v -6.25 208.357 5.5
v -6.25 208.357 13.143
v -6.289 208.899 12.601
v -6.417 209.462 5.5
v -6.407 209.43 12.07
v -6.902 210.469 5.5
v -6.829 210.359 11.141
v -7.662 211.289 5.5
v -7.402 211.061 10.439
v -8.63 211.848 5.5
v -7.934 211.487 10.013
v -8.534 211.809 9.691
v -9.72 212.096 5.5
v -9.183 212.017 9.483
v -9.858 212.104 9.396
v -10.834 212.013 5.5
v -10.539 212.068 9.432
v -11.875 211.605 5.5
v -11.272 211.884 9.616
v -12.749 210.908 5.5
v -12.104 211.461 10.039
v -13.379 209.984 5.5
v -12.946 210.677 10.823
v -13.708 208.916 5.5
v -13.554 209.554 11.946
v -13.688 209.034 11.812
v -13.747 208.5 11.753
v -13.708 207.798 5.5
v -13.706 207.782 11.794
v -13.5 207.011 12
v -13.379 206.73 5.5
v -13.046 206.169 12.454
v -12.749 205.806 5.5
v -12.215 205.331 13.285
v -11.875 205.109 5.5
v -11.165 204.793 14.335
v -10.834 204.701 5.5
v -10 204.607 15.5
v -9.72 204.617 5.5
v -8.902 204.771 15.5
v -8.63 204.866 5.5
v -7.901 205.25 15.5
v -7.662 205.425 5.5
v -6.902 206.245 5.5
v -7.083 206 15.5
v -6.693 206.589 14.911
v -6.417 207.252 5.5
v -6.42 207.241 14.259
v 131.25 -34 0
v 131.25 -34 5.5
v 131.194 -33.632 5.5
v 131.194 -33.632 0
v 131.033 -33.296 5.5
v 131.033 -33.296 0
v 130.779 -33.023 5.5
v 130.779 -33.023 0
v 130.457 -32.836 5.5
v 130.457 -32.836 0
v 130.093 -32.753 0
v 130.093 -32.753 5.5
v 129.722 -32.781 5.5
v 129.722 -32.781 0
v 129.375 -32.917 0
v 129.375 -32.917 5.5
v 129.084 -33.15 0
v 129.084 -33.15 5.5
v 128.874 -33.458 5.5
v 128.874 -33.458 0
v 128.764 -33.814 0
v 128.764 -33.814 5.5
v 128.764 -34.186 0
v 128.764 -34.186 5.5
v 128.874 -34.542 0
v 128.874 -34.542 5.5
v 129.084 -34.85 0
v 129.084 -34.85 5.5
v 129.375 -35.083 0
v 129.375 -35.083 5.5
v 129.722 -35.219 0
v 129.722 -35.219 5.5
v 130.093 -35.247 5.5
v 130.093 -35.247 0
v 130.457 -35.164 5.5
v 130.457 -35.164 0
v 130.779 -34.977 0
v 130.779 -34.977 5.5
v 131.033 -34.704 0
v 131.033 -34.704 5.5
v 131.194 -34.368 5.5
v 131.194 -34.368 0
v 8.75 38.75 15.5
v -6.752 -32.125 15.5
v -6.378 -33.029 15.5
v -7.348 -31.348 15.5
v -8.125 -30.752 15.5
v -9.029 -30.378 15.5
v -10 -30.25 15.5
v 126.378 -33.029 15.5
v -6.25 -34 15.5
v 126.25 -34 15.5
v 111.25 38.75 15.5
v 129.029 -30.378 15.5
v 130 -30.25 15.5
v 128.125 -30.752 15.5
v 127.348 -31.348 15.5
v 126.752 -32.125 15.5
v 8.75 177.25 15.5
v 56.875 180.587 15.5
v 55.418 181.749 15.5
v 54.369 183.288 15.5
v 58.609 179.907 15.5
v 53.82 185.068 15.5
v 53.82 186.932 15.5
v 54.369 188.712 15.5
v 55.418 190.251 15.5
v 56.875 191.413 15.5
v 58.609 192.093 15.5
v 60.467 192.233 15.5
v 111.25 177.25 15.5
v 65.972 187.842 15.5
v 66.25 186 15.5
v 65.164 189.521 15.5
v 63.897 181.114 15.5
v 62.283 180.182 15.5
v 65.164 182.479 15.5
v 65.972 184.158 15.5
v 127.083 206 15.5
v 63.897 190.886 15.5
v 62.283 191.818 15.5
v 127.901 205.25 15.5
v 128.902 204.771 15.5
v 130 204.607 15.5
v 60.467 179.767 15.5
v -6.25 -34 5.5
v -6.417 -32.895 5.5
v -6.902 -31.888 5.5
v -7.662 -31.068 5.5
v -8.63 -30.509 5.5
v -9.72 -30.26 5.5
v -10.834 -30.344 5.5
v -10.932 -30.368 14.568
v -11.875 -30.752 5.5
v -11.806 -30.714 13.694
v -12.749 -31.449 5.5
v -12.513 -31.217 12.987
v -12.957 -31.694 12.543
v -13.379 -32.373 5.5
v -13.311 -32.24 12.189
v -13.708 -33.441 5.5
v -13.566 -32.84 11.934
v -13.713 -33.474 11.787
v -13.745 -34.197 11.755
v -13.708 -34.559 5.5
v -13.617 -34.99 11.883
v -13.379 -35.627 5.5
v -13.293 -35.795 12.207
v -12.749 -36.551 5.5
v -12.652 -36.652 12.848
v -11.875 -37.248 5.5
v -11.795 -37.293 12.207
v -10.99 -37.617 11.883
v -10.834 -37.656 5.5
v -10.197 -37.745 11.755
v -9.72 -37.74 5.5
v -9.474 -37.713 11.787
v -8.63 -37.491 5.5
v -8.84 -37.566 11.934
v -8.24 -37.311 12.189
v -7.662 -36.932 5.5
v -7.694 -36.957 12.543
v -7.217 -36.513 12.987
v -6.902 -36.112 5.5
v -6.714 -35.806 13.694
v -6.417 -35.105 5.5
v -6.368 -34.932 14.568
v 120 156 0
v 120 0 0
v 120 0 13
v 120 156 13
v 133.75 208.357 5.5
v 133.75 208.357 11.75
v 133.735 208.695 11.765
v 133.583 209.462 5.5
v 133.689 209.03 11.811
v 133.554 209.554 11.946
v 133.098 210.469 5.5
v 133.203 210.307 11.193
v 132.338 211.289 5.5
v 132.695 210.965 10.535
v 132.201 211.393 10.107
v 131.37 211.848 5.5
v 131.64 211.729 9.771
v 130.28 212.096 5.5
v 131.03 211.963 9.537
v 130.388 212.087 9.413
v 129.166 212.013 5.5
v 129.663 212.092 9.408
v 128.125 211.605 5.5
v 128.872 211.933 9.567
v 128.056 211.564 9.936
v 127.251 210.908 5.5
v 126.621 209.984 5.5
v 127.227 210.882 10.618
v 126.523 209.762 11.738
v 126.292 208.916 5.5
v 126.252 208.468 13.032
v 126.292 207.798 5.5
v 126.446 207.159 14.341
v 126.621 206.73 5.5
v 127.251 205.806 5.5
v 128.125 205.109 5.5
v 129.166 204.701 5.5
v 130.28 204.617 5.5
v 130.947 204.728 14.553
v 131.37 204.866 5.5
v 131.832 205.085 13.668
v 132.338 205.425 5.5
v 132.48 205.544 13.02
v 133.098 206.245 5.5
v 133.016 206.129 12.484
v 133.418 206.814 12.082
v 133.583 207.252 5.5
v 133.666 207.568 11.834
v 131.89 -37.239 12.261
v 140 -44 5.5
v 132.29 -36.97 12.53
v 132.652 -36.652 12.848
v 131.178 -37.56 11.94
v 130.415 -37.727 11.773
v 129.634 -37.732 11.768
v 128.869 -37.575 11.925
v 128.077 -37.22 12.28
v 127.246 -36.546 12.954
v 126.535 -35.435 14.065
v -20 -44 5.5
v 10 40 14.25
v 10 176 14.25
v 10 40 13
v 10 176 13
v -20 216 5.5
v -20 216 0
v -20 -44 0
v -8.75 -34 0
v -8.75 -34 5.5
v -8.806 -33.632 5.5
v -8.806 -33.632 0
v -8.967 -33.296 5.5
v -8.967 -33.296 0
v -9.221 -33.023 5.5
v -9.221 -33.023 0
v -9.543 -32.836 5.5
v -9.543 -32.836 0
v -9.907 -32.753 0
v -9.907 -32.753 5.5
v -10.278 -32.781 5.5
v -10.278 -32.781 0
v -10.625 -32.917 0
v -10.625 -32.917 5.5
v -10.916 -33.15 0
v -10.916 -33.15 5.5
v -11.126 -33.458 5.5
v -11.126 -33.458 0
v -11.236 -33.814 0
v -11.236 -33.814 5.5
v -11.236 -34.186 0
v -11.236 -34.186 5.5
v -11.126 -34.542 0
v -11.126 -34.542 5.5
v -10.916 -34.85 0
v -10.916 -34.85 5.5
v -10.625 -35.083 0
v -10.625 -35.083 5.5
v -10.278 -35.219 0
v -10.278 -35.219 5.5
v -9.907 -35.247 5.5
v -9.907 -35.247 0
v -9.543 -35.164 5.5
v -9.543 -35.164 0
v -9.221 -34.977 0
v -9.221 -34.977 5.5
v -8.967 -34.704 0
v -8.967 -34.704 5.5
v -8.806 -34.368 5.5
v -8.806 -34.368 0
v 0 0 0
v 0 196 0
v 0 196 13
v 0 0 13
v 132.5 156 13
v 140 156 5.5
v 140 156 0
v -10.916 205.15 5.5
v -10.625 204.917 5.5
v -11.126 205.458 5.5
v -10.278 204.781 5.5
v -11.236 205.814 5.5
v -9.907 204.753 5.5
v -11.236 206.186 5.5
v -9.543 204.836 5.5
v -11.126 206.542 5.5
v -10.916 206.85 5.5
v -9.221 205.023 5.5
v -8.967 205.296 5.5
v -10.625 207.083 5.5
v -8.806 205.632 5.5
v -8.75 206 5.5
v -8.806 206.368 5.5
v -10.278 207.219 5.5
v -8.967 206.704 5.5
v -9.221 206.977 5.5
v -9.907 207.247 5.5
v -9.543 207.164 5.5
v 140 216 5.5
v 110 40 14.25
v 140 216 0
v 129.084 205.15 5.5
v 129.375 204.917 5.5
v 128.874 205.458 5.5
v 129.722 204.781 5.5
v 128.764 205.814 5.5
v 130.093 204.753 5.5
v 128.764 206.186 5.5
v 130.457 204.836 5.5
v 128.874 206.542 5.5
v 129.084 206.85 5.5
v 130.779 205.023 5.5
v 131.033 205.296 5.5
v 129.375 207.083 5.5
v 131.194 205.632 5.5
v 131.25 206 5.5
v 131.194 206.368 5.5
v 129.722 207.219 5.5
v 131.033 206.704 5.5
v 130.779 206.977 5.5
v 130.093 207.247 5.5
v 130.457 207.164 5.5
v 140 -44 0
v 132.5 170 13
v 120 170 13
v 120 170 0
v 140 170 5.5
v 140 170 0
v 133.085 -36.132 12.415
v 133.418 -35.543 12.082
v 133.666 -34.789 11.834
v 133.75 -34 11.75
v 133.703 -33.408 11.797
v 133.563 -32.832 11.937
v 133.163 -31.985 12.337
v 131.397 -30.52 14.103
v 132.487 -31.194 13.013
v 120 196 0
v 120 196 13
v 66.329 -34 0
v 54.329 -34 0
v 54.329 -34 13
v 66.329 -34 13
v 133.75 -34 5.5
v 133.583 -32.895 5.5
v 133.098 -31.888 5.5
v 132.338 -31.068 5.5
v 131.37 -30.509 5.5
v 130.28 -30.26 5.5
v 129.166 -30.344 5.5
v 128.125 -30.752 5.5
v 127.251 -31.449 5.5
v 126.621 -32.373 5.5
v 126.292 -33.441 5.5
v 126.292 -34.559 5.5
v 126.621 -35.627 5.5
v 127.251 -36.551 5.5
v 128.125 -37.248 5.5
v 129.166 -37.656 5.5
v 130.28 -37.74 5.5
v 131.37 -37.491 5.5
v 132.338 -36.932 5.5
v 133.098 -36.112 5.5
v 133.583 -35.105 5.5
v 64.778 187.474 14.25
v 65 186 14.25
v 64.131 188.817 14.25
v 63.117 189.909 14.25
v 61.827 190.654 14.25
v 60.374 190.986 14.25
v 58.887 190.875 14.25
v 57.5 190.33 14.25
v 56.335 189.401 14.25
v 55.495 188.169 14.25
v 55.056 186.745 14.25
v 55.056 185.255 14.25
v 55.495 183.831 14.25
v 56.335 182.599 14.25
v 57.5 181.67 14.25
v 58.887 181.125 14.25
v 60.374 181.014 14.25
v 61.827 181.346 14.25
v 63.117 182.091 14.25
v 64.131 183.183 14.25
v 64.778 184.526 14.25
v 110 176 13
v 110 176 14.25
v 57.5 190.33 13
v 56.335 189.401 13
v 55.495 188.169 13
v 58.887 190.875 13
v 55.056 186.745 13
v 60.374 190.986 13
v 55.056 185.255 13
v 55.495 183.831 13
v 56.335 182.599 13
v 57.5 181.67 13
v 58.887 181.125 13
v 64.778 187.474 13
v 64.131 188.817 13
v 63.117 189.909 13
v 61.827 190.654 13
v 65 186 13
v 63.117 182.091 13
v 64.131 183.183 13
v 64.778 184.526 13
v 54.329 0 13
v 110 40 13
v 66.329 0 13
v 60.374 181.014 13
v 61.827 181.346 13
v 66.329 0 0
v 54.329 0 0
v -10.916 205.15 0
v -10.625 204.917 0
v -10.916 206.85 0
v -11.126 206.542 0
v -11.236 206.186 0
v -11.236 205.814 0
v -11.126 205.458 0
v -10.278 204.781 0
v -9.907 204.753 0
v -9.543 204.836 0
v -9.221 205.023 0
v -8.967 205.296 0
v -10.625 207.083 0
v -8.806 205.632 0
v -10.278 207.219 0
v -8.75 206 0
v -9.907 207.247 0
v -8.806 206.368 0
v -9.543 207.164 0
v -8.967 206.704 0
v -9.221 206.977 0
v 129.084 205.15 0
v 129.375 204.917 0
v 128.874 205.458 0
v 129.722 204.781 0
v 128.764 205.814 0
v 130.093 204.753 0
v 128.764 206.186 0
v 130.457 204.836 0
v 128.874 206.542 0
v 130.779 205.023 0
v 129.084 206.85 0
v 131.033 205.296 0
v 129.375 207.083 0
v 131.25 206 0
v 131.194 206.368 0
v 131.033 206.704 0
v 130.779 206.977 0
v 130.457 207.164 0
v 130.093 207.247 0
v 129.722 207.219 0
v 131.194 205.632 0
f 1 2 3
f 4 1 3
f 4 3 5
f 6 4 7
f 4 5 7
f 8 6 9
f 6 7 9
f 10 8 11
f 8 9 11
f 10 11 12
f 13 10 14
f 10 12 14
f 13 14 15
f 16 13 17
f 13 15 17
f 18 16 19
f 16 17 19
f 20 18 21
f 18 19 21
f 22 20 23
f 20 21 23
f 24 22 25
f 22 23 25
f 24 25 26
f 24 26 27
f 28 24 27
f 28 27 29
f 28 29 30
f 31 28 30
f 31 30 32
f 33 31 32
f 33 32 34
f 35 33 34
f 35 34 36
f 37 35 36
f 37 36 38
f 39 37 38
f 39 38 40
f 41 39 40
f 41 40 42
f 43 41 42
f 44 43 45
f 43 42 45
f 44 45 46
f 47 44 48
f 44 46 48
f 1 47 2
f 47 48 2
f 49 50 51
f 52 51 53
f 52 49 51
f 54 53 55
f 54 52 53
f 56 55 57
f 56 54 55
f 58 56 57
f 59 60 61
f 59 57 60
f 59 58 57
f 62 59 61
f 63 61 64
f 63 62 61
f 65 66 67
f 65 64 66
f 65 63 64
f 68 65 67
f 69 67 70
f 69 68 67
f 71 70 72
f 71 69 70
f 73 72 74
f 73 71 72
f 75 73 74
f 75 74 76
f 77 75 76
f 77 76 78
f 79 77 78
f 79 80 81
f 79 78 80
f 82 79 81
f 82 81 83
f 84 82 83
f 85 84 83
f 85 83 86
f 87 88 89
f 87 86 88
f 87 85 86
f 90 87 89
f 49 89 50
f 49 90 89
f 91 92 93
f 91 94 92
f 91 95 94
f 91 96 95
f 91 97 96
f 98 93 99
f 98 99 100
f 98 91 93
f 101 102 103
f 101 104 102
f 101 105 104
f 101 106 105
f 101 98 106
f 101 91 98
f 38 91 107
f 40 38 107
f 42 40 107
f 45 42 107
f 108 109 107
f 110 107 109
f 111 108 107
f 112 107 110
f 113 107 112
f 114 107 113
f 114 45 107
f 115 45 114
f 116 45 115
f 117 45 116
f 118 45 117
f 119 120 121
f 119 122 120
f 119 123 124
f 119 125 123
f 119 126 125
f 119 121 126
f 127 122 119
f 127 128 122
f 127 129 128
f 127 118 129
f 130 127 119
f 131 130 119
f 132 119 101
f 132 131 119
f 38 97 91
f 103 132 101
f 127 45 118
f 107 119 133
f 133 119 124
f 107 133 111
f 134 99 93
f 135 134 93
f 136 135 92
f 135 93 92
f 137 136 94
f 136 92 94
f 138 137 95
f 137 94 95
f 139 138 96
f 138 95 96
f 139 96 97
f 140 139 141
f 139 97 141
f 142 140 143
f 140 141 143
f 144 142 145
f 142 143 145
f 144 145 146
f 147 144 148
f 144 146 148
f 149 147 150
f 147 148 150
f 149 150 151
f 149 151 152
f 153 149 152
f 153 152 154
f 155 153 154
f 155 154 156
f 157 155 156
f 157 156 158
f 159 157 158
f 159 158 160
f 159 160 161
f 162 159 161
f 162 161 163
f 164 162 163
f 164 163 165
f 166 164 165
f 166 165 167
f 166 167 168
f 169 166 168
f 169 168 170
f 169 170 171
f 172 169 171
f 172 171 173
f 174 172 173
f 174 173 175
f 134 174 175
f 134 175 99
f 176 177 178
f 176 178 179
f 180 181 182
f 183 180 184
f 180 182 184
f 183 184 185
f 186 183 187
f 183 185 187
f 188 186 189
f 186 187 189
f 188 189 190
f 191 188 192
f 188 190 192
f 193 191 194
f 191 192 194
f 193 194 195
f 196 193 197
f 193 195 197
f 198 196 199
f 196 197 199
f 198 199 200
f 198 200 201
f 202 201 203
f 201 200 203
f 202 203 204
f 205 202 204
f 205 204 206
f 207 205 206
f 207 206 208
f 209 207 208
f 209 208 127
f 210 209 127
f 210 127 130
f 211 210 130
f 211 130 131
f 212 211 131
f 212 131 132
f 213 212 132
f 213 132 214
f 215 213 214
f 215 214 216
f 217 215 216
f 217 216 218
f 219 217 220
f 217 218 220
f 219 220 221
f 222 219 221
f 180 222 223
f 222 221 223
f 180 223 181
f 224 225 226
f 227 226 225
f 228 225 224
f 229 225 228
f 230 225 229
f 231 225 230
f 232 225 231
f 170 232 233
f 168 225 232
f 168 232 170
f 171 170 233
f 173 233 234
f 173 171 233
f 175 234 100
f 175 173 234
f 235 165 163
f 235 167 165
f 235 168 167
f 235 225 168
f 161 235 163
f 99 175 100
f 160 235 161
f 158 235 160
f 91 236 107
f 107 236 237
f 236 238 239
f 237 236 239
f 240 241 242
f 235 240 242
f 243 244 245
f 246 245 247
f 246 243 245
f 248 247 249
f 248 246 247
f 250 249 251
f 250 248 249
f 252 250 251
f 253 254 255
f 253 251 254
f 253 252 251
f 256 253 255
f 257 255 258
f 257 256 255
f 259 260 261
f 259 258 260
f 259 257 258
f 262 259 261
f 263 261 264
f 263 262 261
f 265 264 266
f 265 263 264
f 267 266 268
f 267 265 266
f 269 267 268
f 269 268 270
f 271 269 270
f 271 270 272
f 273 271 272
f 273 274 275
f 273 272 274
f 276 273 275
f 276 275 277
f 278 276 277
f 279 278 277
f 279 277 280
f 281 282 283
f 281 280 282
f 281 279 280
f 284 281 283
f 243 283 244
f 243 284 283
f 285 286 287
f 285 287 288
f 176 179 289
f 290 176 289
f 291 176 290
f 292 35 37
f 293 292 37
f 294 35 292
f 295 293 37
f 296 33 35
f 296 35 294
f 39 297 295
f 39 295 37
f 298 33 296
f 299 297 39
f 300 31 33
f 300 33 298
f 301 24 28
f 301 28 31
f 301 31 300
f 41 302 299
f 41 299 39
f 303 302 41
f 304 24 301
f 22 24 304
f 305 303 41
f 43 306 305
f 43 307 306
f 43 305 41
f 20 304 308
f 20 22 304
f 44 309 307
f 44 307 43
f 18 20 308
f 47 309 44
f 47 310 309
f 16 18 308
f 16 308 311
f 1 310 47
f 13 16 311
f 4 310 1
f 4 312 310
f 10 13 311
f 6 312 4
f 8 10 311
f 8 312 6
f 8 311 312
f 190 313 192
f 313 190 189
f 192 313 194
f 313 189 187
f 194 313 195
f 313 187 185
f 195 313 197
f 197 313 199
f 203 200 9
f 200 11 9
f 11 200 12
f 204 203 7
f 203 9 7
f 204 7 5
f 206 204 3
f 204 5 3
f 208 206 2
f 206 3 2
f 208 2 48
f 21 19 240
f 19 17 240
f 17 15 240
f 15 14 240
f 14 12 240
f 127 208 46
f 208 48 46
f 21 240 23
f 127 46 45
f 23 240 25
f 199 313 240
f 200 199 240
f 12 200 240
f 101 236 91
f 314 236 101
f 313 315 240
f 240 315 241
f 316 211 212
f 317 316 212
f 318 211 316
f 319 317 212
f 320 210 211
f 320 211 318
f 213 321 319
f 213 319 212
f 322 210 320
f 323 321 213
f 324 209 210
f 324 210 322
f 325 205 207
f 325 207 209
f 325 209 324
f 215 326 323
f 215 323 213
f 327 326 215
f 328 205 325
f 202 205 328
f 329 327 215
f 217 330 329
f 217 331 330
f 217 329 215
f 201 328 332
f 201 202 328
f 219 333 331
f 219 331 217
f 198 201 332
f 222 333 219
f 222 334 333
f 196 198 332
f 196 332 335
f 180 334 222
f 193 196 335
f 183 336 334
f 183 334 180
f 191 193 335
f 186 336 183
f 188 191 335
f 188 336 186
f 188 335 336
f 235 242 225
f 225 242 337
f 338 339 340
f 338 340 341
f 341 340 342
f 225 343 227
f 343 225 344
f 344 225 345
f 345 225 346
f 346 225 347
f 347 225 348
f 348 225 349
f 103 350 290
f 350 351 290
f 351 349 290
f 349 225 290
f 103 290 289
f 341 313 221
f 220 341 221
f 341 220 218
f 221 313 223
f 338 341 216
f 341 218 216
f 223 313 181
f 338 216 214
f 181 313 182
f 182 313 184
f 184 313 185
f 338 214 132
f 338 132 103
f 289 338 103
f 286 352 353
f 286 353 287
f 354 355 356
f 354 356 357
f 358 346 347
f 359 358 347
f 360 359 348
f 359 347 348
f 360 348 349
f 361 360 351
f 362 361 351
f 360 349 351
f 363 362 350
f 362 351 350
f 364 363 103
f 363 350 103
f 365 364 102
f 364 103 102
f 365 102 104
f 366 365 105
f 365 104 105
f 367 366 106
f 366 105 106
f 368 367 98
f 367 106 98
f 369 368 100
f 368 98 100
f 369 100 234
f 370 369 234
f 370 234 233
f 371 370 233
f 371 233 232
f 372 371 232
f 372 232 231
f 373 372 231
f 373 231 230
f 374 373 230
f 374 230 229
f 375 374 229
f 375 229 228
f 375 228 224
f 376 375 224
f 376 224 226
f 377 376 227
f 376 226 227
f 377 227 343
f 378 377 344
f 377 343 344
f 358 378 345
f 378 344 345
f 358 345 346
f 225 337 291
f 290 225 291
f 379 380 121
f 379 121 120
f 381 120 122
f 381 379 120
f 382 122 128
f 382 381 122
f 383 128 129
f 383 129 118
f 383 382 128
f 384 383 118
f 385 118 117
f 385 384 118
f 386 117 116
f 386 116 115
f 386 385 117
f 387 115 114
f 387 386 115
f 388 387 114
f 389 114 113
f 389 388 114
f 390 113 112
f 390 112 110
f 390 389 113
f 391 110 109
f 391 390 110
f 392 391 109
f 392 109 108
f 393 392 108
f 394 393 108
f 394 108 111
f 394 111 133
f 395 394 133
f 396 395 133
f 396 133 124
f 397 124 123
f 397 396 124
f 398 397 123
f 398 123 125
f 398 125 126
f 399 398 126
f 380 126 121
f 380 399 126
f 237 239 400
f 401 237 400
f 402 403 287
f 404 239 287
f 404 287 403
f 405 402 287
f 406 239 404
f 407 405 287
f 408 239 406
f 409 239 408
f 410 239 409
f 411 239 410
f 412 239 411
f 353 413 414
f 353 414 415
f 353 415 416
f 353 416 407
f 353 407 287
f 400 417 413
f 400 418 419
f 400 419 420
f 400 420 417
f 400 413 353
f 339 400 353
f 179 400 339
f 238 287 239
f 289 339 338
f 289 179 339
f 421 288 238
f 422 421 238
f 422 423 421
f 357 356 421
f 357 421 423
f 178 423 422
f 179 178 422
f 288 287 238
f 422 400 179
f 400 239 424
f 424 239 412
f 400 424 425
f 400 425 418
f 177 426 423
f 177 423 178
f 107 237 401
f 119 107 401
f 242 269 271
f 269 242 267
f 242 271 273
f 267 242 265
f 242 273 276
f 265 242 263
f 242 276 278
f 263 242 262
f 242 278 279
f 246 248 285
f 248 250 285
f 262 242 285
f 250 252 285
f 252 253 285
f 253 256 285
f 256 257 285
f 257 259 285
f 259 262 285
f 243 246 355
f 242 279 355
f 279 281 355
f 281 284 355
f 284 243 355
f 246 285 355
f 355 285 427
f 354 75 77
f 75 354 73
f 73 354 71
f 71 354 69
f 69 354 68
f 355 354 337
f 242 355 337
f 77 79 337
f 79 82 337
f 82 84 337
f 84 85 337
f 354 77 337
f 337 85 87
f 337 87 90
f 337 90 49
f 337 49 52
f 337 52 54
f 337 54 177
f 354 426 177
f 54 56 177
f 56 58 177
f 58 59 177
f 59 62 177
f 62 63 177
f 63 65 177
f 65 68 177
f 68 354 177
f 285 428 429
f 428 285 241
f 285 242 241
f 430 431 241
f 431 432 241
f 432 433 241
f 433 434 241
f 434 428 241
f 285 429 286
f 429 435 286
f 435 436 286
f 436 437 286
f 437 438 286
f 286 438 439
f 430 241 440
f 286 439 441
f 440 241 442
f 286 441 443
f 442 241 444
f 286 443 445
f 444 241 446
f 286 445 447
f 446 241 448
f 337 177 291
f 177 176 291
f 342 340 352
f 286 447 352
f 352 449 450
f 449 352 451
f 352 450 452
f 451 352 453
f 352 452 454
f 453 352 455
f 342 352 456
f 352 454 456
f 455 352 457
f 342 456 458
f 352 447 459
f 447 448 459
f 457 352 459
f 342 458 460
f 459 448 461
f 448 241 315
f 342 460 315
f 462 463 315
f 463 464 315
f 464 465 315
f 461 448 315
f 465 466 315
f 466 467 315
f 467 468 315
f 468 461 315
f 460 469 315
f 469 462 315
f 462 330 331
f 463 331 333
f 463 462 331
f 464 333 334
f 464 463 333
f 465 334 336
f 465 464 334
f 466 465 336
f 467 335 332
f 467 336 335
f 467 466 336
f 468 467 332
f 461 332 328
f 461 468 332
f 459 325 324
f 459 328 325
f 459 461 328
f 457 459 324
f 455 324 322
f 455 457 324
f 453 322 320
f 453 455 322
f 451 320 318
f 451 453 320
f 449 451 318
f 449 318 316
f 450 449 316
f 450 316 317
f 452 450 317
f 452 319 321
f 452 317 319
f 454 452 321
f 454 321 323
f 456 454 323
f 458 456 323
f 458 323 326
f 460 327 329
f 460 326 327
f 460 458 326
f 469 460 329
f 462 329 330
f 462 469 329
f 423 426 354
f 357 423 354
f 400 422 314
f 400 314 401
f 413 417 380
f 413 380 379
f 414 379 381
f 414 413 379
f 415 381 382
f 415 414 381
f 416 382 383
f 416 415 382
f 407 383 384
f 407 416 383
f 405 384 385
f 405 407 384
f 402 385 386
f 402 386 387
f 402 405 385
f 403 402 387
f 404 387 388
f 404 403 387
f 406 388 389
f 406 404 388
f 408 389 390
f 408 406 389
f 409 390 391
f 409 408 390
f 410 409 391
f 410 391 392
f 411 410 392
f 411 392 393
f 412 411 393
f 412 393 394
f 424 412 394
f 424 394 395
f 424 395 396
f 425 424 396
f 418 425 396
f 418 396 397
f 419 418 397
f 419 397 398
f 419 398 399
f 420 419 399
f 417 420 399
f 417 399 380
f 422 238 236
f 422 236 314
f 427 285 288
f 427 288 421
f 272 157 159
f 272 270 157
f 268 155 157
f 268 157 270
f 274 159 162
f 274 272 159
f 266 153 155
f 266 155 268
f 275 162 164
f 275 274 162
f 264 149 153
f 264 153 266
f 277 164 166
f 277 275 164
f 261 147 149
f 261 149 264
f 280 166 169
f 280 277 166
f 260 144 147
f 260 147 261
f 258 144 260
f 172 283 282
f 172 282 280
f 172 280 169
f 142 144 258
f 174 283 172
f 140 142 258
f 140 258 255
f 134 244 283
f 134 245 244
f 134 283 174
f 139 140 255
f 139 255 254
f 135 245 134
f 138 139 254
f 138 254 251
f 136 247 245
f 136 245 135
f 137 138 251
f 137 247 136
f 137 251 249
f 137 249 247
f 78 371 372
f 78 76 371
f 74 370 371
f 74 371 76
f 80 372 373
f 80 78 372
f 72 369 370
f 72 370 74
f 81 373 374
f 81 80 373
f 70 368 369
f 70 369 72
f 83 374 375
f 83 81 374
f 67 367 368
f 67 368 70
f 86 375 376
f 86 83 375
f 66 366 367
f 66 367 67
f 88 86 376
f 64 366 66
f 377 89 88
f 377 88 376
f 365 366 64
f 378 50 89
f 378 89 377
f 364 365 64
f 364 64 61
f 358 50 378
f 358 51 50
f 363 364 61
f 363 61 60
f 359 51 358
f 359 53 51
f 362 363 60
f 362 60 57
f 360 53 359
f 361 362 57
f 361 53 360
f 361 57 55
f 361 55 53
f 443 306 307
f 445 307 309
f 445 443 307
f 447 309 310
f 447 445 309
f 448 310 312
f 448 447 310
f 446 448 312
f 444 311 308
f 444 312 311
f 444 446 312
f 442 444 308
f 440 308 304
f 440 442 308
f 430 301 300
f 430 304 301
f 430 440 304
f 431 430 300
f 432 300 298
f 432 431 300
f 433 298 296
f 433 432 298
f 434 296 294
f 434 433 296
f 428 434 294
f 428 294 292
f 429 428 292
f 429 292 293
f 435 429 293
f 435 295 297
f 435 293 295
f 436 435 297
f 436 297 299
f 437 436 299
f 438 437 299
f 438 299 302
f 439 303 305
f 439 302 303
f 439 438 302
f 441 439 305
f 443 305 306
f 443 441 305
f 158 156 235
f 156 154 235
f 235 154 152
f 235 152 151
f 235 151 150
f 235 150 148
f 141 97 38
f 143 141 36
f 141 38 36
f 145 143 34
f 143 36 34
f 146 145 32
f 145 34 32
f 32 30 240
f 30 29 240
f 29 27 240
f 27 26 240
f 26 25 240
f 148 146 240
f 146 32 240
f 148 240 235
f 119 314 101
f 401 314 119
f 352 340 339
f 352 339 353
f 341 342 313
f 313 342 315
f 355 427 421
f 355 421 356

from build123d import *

# Parameters (mm, degrees)
F0_W        = 100
F0_H        = 136
F0_R        = 5
F0_R_2      = 3.75
F0_R_3      = 1.25
F0_W_2      = 12
F0_H_2      = 44
F1_DEPTH    = 15.5
F2_DEPTH    = 13
F4_R        = 3.75
F5_DEPTH    = 10
F6_T1_DEPTH = 211.4336597593
F6_T3_DEPTH = 311.4336597593
F7_SIZE     = 1.25
F8_SIZE     = 1.25
F9_W        = 12
F9_H        = 34
F9_W_2      = 20
F9_H_2      = 14
F10_DEPTH   = 13


# Not quite as in the source:
# - a fillet or chamfer that OpenCascade refuses, or shapes differently, is made with other operations: its cross-section is extruded or revolved along the edge and cut away or added


with BuildPart() as f1:
    # F0 (on Top) → F1 (new body)
    with BuildSketch(Plane.XY):
        Polygon((0, 196), (0, 0), (54, 0), (66, 0), (120, 0), (120, 196), align=None)
        with Locations((60, 108)):
            Rectangle(F0_W, F0_H, mode=Mode.SUBTRACT)
        with Locations((60, 186)):
            Circle(F0_R, mode=Mode.SUBTRACT)
        Polygon((54, 0), (0, 0), (0, 196), (120, 196), (120, 0), (66, 0), (66, -44), (140, -44), (140, 216), (-20, 216), (-20, -44), (54, -44), align=None)
        with Locations((-10, -34)):
            Circle(F0_R_2, mode=Mode.SUBTRACT)
        with Locations((130, -34)):
            Circle(F0_R_2, mode=Mode.SUBTRACT)
        with Locations((-10, 206)):
            Circle(F0_R_2, mode=Mode.SUBTRACT)
        with Locations((130, 206)):
            Circle(F0_R_2, mode=Mode.SUBTRACT)
        with Locations((130, -34)):
            Circle(F0_R_2)
        with Locations((130, -34)):
            Circle(F0_R_3, mode=Mode.SUBTRACT)
        with Locations((-10, -34)):
            Circle(F0_R_2)
        with Locations((-10, -34)):
            Circle(F0_R_3, mode=Mode.SUBTRACT)
        with Locations((-10, 206)):
            Circle(F0_R_2)
        with Locations((-10, 206)):
            Circle(F0_R_3, mode=Mode.SUBTRACT)
        with Locations((130, 206)):
            Circle(F0_R_2)
        with Locations((130, 206)):
            Circle(F0_R_3, mode=Mode.SUBTRACT)
        with Locations((60, -22)):
            Rectangle(F0_W_2, F0_H_2)
    extrude(amount=F1_DEPTH)

    # F0 (on Top) → F2 (cut)
    with BuildSketch(Plane.XY):
        Polygon((0, 196), (0, 0), (54, 0), (66, 0), (120, 0), (120, 196), align=None)
        with Locations((60, 108)):
            Rectangle(F0_W, F0_H, mode=Mode.SUBTRACT)
        with Locations((60, 186)):
            Circle(F0_R, mode=Mode.SUBTRACT)
    extrude(amount=F2_DEPTH, mode=Mode.SUBTRACT)

    # F4 (on offset) → F5 (cut)
    with BuildSketch(Plane.XY.offset(15.5)):
        with Locations((130, 208.356961264)):
            Circle(F4_R)
        with Locations((-10, 208.356961264)):
            Circle(F4_R)
        with Locations((130, -34)):
            Circle(F4_R)
        with Locations((-10, -34)):
            Circle(F4_R)
    extrude(amount=-F5_DEPTH, mode=Mode.SUBTRACT)

    # F6: chamfer of 10 on 4 edges, made by hand

    # F6_s2 → F6_t1 (cut)
    with BuildSketch(Plane.YZ.offset(-45.7168298797)):
        Polygon((216, 5.5), (206, 15.5), (216, 15.5), align=None)
        Polygon((-44, 5.5), (-34, 15.5), (-44, 15.5), align=None)
    extrude(amount=F6_T1_DEPTH, mode=Mode.SUBTRACT)

    # F6_s4 → F6_t3 (cut)
    with BuildSketch(Plane.XZ.offset(-241.7168298797)):
        Polygon((140, 5.5), (130, 15.5), (140, 15.5), align=None)
        Polygon((-10, 15.5), (-20, 5.5), (-20, 15.5), align=None)
    extrude(amount=F6_T3_DEPTH, mode=Mode.SUBTRACT)

    # F7
    f7_edges = [f1.edges().sort_by_distance(p)[0] for p in [
        (55, 186, 15.5),
    ]]
    chamfer(f7_edges, length=F7_SIZE)

    # F8
    f8_edges = [f1.edges().sort_by_distance(p)[0] for p in [
        (110, 108, 15.5),
        (60, 176, 15.5),
        (10, 108, 15.5),
        (60, 40, 15.5),
    ]]
    chamfer(f8_edges, length=F8_SIZE)

    # F9 (on face) → F10 (cut)
    with BuildSketch(Plane(origin=(0, 0, 0), x_dir=(1, 0, 0), z_dir=(0, 0, -1))):
        with Locations((60.329009831, 17)):
            Rectangle(F9_W, F9_H)
        with Locations((130, -163)):
            Rectangle(F9_W_2, F9_H_2)
    extrude(amount=-F10_DEPTH, mode=Mode.SUBTRACT)


solid = f1.part
